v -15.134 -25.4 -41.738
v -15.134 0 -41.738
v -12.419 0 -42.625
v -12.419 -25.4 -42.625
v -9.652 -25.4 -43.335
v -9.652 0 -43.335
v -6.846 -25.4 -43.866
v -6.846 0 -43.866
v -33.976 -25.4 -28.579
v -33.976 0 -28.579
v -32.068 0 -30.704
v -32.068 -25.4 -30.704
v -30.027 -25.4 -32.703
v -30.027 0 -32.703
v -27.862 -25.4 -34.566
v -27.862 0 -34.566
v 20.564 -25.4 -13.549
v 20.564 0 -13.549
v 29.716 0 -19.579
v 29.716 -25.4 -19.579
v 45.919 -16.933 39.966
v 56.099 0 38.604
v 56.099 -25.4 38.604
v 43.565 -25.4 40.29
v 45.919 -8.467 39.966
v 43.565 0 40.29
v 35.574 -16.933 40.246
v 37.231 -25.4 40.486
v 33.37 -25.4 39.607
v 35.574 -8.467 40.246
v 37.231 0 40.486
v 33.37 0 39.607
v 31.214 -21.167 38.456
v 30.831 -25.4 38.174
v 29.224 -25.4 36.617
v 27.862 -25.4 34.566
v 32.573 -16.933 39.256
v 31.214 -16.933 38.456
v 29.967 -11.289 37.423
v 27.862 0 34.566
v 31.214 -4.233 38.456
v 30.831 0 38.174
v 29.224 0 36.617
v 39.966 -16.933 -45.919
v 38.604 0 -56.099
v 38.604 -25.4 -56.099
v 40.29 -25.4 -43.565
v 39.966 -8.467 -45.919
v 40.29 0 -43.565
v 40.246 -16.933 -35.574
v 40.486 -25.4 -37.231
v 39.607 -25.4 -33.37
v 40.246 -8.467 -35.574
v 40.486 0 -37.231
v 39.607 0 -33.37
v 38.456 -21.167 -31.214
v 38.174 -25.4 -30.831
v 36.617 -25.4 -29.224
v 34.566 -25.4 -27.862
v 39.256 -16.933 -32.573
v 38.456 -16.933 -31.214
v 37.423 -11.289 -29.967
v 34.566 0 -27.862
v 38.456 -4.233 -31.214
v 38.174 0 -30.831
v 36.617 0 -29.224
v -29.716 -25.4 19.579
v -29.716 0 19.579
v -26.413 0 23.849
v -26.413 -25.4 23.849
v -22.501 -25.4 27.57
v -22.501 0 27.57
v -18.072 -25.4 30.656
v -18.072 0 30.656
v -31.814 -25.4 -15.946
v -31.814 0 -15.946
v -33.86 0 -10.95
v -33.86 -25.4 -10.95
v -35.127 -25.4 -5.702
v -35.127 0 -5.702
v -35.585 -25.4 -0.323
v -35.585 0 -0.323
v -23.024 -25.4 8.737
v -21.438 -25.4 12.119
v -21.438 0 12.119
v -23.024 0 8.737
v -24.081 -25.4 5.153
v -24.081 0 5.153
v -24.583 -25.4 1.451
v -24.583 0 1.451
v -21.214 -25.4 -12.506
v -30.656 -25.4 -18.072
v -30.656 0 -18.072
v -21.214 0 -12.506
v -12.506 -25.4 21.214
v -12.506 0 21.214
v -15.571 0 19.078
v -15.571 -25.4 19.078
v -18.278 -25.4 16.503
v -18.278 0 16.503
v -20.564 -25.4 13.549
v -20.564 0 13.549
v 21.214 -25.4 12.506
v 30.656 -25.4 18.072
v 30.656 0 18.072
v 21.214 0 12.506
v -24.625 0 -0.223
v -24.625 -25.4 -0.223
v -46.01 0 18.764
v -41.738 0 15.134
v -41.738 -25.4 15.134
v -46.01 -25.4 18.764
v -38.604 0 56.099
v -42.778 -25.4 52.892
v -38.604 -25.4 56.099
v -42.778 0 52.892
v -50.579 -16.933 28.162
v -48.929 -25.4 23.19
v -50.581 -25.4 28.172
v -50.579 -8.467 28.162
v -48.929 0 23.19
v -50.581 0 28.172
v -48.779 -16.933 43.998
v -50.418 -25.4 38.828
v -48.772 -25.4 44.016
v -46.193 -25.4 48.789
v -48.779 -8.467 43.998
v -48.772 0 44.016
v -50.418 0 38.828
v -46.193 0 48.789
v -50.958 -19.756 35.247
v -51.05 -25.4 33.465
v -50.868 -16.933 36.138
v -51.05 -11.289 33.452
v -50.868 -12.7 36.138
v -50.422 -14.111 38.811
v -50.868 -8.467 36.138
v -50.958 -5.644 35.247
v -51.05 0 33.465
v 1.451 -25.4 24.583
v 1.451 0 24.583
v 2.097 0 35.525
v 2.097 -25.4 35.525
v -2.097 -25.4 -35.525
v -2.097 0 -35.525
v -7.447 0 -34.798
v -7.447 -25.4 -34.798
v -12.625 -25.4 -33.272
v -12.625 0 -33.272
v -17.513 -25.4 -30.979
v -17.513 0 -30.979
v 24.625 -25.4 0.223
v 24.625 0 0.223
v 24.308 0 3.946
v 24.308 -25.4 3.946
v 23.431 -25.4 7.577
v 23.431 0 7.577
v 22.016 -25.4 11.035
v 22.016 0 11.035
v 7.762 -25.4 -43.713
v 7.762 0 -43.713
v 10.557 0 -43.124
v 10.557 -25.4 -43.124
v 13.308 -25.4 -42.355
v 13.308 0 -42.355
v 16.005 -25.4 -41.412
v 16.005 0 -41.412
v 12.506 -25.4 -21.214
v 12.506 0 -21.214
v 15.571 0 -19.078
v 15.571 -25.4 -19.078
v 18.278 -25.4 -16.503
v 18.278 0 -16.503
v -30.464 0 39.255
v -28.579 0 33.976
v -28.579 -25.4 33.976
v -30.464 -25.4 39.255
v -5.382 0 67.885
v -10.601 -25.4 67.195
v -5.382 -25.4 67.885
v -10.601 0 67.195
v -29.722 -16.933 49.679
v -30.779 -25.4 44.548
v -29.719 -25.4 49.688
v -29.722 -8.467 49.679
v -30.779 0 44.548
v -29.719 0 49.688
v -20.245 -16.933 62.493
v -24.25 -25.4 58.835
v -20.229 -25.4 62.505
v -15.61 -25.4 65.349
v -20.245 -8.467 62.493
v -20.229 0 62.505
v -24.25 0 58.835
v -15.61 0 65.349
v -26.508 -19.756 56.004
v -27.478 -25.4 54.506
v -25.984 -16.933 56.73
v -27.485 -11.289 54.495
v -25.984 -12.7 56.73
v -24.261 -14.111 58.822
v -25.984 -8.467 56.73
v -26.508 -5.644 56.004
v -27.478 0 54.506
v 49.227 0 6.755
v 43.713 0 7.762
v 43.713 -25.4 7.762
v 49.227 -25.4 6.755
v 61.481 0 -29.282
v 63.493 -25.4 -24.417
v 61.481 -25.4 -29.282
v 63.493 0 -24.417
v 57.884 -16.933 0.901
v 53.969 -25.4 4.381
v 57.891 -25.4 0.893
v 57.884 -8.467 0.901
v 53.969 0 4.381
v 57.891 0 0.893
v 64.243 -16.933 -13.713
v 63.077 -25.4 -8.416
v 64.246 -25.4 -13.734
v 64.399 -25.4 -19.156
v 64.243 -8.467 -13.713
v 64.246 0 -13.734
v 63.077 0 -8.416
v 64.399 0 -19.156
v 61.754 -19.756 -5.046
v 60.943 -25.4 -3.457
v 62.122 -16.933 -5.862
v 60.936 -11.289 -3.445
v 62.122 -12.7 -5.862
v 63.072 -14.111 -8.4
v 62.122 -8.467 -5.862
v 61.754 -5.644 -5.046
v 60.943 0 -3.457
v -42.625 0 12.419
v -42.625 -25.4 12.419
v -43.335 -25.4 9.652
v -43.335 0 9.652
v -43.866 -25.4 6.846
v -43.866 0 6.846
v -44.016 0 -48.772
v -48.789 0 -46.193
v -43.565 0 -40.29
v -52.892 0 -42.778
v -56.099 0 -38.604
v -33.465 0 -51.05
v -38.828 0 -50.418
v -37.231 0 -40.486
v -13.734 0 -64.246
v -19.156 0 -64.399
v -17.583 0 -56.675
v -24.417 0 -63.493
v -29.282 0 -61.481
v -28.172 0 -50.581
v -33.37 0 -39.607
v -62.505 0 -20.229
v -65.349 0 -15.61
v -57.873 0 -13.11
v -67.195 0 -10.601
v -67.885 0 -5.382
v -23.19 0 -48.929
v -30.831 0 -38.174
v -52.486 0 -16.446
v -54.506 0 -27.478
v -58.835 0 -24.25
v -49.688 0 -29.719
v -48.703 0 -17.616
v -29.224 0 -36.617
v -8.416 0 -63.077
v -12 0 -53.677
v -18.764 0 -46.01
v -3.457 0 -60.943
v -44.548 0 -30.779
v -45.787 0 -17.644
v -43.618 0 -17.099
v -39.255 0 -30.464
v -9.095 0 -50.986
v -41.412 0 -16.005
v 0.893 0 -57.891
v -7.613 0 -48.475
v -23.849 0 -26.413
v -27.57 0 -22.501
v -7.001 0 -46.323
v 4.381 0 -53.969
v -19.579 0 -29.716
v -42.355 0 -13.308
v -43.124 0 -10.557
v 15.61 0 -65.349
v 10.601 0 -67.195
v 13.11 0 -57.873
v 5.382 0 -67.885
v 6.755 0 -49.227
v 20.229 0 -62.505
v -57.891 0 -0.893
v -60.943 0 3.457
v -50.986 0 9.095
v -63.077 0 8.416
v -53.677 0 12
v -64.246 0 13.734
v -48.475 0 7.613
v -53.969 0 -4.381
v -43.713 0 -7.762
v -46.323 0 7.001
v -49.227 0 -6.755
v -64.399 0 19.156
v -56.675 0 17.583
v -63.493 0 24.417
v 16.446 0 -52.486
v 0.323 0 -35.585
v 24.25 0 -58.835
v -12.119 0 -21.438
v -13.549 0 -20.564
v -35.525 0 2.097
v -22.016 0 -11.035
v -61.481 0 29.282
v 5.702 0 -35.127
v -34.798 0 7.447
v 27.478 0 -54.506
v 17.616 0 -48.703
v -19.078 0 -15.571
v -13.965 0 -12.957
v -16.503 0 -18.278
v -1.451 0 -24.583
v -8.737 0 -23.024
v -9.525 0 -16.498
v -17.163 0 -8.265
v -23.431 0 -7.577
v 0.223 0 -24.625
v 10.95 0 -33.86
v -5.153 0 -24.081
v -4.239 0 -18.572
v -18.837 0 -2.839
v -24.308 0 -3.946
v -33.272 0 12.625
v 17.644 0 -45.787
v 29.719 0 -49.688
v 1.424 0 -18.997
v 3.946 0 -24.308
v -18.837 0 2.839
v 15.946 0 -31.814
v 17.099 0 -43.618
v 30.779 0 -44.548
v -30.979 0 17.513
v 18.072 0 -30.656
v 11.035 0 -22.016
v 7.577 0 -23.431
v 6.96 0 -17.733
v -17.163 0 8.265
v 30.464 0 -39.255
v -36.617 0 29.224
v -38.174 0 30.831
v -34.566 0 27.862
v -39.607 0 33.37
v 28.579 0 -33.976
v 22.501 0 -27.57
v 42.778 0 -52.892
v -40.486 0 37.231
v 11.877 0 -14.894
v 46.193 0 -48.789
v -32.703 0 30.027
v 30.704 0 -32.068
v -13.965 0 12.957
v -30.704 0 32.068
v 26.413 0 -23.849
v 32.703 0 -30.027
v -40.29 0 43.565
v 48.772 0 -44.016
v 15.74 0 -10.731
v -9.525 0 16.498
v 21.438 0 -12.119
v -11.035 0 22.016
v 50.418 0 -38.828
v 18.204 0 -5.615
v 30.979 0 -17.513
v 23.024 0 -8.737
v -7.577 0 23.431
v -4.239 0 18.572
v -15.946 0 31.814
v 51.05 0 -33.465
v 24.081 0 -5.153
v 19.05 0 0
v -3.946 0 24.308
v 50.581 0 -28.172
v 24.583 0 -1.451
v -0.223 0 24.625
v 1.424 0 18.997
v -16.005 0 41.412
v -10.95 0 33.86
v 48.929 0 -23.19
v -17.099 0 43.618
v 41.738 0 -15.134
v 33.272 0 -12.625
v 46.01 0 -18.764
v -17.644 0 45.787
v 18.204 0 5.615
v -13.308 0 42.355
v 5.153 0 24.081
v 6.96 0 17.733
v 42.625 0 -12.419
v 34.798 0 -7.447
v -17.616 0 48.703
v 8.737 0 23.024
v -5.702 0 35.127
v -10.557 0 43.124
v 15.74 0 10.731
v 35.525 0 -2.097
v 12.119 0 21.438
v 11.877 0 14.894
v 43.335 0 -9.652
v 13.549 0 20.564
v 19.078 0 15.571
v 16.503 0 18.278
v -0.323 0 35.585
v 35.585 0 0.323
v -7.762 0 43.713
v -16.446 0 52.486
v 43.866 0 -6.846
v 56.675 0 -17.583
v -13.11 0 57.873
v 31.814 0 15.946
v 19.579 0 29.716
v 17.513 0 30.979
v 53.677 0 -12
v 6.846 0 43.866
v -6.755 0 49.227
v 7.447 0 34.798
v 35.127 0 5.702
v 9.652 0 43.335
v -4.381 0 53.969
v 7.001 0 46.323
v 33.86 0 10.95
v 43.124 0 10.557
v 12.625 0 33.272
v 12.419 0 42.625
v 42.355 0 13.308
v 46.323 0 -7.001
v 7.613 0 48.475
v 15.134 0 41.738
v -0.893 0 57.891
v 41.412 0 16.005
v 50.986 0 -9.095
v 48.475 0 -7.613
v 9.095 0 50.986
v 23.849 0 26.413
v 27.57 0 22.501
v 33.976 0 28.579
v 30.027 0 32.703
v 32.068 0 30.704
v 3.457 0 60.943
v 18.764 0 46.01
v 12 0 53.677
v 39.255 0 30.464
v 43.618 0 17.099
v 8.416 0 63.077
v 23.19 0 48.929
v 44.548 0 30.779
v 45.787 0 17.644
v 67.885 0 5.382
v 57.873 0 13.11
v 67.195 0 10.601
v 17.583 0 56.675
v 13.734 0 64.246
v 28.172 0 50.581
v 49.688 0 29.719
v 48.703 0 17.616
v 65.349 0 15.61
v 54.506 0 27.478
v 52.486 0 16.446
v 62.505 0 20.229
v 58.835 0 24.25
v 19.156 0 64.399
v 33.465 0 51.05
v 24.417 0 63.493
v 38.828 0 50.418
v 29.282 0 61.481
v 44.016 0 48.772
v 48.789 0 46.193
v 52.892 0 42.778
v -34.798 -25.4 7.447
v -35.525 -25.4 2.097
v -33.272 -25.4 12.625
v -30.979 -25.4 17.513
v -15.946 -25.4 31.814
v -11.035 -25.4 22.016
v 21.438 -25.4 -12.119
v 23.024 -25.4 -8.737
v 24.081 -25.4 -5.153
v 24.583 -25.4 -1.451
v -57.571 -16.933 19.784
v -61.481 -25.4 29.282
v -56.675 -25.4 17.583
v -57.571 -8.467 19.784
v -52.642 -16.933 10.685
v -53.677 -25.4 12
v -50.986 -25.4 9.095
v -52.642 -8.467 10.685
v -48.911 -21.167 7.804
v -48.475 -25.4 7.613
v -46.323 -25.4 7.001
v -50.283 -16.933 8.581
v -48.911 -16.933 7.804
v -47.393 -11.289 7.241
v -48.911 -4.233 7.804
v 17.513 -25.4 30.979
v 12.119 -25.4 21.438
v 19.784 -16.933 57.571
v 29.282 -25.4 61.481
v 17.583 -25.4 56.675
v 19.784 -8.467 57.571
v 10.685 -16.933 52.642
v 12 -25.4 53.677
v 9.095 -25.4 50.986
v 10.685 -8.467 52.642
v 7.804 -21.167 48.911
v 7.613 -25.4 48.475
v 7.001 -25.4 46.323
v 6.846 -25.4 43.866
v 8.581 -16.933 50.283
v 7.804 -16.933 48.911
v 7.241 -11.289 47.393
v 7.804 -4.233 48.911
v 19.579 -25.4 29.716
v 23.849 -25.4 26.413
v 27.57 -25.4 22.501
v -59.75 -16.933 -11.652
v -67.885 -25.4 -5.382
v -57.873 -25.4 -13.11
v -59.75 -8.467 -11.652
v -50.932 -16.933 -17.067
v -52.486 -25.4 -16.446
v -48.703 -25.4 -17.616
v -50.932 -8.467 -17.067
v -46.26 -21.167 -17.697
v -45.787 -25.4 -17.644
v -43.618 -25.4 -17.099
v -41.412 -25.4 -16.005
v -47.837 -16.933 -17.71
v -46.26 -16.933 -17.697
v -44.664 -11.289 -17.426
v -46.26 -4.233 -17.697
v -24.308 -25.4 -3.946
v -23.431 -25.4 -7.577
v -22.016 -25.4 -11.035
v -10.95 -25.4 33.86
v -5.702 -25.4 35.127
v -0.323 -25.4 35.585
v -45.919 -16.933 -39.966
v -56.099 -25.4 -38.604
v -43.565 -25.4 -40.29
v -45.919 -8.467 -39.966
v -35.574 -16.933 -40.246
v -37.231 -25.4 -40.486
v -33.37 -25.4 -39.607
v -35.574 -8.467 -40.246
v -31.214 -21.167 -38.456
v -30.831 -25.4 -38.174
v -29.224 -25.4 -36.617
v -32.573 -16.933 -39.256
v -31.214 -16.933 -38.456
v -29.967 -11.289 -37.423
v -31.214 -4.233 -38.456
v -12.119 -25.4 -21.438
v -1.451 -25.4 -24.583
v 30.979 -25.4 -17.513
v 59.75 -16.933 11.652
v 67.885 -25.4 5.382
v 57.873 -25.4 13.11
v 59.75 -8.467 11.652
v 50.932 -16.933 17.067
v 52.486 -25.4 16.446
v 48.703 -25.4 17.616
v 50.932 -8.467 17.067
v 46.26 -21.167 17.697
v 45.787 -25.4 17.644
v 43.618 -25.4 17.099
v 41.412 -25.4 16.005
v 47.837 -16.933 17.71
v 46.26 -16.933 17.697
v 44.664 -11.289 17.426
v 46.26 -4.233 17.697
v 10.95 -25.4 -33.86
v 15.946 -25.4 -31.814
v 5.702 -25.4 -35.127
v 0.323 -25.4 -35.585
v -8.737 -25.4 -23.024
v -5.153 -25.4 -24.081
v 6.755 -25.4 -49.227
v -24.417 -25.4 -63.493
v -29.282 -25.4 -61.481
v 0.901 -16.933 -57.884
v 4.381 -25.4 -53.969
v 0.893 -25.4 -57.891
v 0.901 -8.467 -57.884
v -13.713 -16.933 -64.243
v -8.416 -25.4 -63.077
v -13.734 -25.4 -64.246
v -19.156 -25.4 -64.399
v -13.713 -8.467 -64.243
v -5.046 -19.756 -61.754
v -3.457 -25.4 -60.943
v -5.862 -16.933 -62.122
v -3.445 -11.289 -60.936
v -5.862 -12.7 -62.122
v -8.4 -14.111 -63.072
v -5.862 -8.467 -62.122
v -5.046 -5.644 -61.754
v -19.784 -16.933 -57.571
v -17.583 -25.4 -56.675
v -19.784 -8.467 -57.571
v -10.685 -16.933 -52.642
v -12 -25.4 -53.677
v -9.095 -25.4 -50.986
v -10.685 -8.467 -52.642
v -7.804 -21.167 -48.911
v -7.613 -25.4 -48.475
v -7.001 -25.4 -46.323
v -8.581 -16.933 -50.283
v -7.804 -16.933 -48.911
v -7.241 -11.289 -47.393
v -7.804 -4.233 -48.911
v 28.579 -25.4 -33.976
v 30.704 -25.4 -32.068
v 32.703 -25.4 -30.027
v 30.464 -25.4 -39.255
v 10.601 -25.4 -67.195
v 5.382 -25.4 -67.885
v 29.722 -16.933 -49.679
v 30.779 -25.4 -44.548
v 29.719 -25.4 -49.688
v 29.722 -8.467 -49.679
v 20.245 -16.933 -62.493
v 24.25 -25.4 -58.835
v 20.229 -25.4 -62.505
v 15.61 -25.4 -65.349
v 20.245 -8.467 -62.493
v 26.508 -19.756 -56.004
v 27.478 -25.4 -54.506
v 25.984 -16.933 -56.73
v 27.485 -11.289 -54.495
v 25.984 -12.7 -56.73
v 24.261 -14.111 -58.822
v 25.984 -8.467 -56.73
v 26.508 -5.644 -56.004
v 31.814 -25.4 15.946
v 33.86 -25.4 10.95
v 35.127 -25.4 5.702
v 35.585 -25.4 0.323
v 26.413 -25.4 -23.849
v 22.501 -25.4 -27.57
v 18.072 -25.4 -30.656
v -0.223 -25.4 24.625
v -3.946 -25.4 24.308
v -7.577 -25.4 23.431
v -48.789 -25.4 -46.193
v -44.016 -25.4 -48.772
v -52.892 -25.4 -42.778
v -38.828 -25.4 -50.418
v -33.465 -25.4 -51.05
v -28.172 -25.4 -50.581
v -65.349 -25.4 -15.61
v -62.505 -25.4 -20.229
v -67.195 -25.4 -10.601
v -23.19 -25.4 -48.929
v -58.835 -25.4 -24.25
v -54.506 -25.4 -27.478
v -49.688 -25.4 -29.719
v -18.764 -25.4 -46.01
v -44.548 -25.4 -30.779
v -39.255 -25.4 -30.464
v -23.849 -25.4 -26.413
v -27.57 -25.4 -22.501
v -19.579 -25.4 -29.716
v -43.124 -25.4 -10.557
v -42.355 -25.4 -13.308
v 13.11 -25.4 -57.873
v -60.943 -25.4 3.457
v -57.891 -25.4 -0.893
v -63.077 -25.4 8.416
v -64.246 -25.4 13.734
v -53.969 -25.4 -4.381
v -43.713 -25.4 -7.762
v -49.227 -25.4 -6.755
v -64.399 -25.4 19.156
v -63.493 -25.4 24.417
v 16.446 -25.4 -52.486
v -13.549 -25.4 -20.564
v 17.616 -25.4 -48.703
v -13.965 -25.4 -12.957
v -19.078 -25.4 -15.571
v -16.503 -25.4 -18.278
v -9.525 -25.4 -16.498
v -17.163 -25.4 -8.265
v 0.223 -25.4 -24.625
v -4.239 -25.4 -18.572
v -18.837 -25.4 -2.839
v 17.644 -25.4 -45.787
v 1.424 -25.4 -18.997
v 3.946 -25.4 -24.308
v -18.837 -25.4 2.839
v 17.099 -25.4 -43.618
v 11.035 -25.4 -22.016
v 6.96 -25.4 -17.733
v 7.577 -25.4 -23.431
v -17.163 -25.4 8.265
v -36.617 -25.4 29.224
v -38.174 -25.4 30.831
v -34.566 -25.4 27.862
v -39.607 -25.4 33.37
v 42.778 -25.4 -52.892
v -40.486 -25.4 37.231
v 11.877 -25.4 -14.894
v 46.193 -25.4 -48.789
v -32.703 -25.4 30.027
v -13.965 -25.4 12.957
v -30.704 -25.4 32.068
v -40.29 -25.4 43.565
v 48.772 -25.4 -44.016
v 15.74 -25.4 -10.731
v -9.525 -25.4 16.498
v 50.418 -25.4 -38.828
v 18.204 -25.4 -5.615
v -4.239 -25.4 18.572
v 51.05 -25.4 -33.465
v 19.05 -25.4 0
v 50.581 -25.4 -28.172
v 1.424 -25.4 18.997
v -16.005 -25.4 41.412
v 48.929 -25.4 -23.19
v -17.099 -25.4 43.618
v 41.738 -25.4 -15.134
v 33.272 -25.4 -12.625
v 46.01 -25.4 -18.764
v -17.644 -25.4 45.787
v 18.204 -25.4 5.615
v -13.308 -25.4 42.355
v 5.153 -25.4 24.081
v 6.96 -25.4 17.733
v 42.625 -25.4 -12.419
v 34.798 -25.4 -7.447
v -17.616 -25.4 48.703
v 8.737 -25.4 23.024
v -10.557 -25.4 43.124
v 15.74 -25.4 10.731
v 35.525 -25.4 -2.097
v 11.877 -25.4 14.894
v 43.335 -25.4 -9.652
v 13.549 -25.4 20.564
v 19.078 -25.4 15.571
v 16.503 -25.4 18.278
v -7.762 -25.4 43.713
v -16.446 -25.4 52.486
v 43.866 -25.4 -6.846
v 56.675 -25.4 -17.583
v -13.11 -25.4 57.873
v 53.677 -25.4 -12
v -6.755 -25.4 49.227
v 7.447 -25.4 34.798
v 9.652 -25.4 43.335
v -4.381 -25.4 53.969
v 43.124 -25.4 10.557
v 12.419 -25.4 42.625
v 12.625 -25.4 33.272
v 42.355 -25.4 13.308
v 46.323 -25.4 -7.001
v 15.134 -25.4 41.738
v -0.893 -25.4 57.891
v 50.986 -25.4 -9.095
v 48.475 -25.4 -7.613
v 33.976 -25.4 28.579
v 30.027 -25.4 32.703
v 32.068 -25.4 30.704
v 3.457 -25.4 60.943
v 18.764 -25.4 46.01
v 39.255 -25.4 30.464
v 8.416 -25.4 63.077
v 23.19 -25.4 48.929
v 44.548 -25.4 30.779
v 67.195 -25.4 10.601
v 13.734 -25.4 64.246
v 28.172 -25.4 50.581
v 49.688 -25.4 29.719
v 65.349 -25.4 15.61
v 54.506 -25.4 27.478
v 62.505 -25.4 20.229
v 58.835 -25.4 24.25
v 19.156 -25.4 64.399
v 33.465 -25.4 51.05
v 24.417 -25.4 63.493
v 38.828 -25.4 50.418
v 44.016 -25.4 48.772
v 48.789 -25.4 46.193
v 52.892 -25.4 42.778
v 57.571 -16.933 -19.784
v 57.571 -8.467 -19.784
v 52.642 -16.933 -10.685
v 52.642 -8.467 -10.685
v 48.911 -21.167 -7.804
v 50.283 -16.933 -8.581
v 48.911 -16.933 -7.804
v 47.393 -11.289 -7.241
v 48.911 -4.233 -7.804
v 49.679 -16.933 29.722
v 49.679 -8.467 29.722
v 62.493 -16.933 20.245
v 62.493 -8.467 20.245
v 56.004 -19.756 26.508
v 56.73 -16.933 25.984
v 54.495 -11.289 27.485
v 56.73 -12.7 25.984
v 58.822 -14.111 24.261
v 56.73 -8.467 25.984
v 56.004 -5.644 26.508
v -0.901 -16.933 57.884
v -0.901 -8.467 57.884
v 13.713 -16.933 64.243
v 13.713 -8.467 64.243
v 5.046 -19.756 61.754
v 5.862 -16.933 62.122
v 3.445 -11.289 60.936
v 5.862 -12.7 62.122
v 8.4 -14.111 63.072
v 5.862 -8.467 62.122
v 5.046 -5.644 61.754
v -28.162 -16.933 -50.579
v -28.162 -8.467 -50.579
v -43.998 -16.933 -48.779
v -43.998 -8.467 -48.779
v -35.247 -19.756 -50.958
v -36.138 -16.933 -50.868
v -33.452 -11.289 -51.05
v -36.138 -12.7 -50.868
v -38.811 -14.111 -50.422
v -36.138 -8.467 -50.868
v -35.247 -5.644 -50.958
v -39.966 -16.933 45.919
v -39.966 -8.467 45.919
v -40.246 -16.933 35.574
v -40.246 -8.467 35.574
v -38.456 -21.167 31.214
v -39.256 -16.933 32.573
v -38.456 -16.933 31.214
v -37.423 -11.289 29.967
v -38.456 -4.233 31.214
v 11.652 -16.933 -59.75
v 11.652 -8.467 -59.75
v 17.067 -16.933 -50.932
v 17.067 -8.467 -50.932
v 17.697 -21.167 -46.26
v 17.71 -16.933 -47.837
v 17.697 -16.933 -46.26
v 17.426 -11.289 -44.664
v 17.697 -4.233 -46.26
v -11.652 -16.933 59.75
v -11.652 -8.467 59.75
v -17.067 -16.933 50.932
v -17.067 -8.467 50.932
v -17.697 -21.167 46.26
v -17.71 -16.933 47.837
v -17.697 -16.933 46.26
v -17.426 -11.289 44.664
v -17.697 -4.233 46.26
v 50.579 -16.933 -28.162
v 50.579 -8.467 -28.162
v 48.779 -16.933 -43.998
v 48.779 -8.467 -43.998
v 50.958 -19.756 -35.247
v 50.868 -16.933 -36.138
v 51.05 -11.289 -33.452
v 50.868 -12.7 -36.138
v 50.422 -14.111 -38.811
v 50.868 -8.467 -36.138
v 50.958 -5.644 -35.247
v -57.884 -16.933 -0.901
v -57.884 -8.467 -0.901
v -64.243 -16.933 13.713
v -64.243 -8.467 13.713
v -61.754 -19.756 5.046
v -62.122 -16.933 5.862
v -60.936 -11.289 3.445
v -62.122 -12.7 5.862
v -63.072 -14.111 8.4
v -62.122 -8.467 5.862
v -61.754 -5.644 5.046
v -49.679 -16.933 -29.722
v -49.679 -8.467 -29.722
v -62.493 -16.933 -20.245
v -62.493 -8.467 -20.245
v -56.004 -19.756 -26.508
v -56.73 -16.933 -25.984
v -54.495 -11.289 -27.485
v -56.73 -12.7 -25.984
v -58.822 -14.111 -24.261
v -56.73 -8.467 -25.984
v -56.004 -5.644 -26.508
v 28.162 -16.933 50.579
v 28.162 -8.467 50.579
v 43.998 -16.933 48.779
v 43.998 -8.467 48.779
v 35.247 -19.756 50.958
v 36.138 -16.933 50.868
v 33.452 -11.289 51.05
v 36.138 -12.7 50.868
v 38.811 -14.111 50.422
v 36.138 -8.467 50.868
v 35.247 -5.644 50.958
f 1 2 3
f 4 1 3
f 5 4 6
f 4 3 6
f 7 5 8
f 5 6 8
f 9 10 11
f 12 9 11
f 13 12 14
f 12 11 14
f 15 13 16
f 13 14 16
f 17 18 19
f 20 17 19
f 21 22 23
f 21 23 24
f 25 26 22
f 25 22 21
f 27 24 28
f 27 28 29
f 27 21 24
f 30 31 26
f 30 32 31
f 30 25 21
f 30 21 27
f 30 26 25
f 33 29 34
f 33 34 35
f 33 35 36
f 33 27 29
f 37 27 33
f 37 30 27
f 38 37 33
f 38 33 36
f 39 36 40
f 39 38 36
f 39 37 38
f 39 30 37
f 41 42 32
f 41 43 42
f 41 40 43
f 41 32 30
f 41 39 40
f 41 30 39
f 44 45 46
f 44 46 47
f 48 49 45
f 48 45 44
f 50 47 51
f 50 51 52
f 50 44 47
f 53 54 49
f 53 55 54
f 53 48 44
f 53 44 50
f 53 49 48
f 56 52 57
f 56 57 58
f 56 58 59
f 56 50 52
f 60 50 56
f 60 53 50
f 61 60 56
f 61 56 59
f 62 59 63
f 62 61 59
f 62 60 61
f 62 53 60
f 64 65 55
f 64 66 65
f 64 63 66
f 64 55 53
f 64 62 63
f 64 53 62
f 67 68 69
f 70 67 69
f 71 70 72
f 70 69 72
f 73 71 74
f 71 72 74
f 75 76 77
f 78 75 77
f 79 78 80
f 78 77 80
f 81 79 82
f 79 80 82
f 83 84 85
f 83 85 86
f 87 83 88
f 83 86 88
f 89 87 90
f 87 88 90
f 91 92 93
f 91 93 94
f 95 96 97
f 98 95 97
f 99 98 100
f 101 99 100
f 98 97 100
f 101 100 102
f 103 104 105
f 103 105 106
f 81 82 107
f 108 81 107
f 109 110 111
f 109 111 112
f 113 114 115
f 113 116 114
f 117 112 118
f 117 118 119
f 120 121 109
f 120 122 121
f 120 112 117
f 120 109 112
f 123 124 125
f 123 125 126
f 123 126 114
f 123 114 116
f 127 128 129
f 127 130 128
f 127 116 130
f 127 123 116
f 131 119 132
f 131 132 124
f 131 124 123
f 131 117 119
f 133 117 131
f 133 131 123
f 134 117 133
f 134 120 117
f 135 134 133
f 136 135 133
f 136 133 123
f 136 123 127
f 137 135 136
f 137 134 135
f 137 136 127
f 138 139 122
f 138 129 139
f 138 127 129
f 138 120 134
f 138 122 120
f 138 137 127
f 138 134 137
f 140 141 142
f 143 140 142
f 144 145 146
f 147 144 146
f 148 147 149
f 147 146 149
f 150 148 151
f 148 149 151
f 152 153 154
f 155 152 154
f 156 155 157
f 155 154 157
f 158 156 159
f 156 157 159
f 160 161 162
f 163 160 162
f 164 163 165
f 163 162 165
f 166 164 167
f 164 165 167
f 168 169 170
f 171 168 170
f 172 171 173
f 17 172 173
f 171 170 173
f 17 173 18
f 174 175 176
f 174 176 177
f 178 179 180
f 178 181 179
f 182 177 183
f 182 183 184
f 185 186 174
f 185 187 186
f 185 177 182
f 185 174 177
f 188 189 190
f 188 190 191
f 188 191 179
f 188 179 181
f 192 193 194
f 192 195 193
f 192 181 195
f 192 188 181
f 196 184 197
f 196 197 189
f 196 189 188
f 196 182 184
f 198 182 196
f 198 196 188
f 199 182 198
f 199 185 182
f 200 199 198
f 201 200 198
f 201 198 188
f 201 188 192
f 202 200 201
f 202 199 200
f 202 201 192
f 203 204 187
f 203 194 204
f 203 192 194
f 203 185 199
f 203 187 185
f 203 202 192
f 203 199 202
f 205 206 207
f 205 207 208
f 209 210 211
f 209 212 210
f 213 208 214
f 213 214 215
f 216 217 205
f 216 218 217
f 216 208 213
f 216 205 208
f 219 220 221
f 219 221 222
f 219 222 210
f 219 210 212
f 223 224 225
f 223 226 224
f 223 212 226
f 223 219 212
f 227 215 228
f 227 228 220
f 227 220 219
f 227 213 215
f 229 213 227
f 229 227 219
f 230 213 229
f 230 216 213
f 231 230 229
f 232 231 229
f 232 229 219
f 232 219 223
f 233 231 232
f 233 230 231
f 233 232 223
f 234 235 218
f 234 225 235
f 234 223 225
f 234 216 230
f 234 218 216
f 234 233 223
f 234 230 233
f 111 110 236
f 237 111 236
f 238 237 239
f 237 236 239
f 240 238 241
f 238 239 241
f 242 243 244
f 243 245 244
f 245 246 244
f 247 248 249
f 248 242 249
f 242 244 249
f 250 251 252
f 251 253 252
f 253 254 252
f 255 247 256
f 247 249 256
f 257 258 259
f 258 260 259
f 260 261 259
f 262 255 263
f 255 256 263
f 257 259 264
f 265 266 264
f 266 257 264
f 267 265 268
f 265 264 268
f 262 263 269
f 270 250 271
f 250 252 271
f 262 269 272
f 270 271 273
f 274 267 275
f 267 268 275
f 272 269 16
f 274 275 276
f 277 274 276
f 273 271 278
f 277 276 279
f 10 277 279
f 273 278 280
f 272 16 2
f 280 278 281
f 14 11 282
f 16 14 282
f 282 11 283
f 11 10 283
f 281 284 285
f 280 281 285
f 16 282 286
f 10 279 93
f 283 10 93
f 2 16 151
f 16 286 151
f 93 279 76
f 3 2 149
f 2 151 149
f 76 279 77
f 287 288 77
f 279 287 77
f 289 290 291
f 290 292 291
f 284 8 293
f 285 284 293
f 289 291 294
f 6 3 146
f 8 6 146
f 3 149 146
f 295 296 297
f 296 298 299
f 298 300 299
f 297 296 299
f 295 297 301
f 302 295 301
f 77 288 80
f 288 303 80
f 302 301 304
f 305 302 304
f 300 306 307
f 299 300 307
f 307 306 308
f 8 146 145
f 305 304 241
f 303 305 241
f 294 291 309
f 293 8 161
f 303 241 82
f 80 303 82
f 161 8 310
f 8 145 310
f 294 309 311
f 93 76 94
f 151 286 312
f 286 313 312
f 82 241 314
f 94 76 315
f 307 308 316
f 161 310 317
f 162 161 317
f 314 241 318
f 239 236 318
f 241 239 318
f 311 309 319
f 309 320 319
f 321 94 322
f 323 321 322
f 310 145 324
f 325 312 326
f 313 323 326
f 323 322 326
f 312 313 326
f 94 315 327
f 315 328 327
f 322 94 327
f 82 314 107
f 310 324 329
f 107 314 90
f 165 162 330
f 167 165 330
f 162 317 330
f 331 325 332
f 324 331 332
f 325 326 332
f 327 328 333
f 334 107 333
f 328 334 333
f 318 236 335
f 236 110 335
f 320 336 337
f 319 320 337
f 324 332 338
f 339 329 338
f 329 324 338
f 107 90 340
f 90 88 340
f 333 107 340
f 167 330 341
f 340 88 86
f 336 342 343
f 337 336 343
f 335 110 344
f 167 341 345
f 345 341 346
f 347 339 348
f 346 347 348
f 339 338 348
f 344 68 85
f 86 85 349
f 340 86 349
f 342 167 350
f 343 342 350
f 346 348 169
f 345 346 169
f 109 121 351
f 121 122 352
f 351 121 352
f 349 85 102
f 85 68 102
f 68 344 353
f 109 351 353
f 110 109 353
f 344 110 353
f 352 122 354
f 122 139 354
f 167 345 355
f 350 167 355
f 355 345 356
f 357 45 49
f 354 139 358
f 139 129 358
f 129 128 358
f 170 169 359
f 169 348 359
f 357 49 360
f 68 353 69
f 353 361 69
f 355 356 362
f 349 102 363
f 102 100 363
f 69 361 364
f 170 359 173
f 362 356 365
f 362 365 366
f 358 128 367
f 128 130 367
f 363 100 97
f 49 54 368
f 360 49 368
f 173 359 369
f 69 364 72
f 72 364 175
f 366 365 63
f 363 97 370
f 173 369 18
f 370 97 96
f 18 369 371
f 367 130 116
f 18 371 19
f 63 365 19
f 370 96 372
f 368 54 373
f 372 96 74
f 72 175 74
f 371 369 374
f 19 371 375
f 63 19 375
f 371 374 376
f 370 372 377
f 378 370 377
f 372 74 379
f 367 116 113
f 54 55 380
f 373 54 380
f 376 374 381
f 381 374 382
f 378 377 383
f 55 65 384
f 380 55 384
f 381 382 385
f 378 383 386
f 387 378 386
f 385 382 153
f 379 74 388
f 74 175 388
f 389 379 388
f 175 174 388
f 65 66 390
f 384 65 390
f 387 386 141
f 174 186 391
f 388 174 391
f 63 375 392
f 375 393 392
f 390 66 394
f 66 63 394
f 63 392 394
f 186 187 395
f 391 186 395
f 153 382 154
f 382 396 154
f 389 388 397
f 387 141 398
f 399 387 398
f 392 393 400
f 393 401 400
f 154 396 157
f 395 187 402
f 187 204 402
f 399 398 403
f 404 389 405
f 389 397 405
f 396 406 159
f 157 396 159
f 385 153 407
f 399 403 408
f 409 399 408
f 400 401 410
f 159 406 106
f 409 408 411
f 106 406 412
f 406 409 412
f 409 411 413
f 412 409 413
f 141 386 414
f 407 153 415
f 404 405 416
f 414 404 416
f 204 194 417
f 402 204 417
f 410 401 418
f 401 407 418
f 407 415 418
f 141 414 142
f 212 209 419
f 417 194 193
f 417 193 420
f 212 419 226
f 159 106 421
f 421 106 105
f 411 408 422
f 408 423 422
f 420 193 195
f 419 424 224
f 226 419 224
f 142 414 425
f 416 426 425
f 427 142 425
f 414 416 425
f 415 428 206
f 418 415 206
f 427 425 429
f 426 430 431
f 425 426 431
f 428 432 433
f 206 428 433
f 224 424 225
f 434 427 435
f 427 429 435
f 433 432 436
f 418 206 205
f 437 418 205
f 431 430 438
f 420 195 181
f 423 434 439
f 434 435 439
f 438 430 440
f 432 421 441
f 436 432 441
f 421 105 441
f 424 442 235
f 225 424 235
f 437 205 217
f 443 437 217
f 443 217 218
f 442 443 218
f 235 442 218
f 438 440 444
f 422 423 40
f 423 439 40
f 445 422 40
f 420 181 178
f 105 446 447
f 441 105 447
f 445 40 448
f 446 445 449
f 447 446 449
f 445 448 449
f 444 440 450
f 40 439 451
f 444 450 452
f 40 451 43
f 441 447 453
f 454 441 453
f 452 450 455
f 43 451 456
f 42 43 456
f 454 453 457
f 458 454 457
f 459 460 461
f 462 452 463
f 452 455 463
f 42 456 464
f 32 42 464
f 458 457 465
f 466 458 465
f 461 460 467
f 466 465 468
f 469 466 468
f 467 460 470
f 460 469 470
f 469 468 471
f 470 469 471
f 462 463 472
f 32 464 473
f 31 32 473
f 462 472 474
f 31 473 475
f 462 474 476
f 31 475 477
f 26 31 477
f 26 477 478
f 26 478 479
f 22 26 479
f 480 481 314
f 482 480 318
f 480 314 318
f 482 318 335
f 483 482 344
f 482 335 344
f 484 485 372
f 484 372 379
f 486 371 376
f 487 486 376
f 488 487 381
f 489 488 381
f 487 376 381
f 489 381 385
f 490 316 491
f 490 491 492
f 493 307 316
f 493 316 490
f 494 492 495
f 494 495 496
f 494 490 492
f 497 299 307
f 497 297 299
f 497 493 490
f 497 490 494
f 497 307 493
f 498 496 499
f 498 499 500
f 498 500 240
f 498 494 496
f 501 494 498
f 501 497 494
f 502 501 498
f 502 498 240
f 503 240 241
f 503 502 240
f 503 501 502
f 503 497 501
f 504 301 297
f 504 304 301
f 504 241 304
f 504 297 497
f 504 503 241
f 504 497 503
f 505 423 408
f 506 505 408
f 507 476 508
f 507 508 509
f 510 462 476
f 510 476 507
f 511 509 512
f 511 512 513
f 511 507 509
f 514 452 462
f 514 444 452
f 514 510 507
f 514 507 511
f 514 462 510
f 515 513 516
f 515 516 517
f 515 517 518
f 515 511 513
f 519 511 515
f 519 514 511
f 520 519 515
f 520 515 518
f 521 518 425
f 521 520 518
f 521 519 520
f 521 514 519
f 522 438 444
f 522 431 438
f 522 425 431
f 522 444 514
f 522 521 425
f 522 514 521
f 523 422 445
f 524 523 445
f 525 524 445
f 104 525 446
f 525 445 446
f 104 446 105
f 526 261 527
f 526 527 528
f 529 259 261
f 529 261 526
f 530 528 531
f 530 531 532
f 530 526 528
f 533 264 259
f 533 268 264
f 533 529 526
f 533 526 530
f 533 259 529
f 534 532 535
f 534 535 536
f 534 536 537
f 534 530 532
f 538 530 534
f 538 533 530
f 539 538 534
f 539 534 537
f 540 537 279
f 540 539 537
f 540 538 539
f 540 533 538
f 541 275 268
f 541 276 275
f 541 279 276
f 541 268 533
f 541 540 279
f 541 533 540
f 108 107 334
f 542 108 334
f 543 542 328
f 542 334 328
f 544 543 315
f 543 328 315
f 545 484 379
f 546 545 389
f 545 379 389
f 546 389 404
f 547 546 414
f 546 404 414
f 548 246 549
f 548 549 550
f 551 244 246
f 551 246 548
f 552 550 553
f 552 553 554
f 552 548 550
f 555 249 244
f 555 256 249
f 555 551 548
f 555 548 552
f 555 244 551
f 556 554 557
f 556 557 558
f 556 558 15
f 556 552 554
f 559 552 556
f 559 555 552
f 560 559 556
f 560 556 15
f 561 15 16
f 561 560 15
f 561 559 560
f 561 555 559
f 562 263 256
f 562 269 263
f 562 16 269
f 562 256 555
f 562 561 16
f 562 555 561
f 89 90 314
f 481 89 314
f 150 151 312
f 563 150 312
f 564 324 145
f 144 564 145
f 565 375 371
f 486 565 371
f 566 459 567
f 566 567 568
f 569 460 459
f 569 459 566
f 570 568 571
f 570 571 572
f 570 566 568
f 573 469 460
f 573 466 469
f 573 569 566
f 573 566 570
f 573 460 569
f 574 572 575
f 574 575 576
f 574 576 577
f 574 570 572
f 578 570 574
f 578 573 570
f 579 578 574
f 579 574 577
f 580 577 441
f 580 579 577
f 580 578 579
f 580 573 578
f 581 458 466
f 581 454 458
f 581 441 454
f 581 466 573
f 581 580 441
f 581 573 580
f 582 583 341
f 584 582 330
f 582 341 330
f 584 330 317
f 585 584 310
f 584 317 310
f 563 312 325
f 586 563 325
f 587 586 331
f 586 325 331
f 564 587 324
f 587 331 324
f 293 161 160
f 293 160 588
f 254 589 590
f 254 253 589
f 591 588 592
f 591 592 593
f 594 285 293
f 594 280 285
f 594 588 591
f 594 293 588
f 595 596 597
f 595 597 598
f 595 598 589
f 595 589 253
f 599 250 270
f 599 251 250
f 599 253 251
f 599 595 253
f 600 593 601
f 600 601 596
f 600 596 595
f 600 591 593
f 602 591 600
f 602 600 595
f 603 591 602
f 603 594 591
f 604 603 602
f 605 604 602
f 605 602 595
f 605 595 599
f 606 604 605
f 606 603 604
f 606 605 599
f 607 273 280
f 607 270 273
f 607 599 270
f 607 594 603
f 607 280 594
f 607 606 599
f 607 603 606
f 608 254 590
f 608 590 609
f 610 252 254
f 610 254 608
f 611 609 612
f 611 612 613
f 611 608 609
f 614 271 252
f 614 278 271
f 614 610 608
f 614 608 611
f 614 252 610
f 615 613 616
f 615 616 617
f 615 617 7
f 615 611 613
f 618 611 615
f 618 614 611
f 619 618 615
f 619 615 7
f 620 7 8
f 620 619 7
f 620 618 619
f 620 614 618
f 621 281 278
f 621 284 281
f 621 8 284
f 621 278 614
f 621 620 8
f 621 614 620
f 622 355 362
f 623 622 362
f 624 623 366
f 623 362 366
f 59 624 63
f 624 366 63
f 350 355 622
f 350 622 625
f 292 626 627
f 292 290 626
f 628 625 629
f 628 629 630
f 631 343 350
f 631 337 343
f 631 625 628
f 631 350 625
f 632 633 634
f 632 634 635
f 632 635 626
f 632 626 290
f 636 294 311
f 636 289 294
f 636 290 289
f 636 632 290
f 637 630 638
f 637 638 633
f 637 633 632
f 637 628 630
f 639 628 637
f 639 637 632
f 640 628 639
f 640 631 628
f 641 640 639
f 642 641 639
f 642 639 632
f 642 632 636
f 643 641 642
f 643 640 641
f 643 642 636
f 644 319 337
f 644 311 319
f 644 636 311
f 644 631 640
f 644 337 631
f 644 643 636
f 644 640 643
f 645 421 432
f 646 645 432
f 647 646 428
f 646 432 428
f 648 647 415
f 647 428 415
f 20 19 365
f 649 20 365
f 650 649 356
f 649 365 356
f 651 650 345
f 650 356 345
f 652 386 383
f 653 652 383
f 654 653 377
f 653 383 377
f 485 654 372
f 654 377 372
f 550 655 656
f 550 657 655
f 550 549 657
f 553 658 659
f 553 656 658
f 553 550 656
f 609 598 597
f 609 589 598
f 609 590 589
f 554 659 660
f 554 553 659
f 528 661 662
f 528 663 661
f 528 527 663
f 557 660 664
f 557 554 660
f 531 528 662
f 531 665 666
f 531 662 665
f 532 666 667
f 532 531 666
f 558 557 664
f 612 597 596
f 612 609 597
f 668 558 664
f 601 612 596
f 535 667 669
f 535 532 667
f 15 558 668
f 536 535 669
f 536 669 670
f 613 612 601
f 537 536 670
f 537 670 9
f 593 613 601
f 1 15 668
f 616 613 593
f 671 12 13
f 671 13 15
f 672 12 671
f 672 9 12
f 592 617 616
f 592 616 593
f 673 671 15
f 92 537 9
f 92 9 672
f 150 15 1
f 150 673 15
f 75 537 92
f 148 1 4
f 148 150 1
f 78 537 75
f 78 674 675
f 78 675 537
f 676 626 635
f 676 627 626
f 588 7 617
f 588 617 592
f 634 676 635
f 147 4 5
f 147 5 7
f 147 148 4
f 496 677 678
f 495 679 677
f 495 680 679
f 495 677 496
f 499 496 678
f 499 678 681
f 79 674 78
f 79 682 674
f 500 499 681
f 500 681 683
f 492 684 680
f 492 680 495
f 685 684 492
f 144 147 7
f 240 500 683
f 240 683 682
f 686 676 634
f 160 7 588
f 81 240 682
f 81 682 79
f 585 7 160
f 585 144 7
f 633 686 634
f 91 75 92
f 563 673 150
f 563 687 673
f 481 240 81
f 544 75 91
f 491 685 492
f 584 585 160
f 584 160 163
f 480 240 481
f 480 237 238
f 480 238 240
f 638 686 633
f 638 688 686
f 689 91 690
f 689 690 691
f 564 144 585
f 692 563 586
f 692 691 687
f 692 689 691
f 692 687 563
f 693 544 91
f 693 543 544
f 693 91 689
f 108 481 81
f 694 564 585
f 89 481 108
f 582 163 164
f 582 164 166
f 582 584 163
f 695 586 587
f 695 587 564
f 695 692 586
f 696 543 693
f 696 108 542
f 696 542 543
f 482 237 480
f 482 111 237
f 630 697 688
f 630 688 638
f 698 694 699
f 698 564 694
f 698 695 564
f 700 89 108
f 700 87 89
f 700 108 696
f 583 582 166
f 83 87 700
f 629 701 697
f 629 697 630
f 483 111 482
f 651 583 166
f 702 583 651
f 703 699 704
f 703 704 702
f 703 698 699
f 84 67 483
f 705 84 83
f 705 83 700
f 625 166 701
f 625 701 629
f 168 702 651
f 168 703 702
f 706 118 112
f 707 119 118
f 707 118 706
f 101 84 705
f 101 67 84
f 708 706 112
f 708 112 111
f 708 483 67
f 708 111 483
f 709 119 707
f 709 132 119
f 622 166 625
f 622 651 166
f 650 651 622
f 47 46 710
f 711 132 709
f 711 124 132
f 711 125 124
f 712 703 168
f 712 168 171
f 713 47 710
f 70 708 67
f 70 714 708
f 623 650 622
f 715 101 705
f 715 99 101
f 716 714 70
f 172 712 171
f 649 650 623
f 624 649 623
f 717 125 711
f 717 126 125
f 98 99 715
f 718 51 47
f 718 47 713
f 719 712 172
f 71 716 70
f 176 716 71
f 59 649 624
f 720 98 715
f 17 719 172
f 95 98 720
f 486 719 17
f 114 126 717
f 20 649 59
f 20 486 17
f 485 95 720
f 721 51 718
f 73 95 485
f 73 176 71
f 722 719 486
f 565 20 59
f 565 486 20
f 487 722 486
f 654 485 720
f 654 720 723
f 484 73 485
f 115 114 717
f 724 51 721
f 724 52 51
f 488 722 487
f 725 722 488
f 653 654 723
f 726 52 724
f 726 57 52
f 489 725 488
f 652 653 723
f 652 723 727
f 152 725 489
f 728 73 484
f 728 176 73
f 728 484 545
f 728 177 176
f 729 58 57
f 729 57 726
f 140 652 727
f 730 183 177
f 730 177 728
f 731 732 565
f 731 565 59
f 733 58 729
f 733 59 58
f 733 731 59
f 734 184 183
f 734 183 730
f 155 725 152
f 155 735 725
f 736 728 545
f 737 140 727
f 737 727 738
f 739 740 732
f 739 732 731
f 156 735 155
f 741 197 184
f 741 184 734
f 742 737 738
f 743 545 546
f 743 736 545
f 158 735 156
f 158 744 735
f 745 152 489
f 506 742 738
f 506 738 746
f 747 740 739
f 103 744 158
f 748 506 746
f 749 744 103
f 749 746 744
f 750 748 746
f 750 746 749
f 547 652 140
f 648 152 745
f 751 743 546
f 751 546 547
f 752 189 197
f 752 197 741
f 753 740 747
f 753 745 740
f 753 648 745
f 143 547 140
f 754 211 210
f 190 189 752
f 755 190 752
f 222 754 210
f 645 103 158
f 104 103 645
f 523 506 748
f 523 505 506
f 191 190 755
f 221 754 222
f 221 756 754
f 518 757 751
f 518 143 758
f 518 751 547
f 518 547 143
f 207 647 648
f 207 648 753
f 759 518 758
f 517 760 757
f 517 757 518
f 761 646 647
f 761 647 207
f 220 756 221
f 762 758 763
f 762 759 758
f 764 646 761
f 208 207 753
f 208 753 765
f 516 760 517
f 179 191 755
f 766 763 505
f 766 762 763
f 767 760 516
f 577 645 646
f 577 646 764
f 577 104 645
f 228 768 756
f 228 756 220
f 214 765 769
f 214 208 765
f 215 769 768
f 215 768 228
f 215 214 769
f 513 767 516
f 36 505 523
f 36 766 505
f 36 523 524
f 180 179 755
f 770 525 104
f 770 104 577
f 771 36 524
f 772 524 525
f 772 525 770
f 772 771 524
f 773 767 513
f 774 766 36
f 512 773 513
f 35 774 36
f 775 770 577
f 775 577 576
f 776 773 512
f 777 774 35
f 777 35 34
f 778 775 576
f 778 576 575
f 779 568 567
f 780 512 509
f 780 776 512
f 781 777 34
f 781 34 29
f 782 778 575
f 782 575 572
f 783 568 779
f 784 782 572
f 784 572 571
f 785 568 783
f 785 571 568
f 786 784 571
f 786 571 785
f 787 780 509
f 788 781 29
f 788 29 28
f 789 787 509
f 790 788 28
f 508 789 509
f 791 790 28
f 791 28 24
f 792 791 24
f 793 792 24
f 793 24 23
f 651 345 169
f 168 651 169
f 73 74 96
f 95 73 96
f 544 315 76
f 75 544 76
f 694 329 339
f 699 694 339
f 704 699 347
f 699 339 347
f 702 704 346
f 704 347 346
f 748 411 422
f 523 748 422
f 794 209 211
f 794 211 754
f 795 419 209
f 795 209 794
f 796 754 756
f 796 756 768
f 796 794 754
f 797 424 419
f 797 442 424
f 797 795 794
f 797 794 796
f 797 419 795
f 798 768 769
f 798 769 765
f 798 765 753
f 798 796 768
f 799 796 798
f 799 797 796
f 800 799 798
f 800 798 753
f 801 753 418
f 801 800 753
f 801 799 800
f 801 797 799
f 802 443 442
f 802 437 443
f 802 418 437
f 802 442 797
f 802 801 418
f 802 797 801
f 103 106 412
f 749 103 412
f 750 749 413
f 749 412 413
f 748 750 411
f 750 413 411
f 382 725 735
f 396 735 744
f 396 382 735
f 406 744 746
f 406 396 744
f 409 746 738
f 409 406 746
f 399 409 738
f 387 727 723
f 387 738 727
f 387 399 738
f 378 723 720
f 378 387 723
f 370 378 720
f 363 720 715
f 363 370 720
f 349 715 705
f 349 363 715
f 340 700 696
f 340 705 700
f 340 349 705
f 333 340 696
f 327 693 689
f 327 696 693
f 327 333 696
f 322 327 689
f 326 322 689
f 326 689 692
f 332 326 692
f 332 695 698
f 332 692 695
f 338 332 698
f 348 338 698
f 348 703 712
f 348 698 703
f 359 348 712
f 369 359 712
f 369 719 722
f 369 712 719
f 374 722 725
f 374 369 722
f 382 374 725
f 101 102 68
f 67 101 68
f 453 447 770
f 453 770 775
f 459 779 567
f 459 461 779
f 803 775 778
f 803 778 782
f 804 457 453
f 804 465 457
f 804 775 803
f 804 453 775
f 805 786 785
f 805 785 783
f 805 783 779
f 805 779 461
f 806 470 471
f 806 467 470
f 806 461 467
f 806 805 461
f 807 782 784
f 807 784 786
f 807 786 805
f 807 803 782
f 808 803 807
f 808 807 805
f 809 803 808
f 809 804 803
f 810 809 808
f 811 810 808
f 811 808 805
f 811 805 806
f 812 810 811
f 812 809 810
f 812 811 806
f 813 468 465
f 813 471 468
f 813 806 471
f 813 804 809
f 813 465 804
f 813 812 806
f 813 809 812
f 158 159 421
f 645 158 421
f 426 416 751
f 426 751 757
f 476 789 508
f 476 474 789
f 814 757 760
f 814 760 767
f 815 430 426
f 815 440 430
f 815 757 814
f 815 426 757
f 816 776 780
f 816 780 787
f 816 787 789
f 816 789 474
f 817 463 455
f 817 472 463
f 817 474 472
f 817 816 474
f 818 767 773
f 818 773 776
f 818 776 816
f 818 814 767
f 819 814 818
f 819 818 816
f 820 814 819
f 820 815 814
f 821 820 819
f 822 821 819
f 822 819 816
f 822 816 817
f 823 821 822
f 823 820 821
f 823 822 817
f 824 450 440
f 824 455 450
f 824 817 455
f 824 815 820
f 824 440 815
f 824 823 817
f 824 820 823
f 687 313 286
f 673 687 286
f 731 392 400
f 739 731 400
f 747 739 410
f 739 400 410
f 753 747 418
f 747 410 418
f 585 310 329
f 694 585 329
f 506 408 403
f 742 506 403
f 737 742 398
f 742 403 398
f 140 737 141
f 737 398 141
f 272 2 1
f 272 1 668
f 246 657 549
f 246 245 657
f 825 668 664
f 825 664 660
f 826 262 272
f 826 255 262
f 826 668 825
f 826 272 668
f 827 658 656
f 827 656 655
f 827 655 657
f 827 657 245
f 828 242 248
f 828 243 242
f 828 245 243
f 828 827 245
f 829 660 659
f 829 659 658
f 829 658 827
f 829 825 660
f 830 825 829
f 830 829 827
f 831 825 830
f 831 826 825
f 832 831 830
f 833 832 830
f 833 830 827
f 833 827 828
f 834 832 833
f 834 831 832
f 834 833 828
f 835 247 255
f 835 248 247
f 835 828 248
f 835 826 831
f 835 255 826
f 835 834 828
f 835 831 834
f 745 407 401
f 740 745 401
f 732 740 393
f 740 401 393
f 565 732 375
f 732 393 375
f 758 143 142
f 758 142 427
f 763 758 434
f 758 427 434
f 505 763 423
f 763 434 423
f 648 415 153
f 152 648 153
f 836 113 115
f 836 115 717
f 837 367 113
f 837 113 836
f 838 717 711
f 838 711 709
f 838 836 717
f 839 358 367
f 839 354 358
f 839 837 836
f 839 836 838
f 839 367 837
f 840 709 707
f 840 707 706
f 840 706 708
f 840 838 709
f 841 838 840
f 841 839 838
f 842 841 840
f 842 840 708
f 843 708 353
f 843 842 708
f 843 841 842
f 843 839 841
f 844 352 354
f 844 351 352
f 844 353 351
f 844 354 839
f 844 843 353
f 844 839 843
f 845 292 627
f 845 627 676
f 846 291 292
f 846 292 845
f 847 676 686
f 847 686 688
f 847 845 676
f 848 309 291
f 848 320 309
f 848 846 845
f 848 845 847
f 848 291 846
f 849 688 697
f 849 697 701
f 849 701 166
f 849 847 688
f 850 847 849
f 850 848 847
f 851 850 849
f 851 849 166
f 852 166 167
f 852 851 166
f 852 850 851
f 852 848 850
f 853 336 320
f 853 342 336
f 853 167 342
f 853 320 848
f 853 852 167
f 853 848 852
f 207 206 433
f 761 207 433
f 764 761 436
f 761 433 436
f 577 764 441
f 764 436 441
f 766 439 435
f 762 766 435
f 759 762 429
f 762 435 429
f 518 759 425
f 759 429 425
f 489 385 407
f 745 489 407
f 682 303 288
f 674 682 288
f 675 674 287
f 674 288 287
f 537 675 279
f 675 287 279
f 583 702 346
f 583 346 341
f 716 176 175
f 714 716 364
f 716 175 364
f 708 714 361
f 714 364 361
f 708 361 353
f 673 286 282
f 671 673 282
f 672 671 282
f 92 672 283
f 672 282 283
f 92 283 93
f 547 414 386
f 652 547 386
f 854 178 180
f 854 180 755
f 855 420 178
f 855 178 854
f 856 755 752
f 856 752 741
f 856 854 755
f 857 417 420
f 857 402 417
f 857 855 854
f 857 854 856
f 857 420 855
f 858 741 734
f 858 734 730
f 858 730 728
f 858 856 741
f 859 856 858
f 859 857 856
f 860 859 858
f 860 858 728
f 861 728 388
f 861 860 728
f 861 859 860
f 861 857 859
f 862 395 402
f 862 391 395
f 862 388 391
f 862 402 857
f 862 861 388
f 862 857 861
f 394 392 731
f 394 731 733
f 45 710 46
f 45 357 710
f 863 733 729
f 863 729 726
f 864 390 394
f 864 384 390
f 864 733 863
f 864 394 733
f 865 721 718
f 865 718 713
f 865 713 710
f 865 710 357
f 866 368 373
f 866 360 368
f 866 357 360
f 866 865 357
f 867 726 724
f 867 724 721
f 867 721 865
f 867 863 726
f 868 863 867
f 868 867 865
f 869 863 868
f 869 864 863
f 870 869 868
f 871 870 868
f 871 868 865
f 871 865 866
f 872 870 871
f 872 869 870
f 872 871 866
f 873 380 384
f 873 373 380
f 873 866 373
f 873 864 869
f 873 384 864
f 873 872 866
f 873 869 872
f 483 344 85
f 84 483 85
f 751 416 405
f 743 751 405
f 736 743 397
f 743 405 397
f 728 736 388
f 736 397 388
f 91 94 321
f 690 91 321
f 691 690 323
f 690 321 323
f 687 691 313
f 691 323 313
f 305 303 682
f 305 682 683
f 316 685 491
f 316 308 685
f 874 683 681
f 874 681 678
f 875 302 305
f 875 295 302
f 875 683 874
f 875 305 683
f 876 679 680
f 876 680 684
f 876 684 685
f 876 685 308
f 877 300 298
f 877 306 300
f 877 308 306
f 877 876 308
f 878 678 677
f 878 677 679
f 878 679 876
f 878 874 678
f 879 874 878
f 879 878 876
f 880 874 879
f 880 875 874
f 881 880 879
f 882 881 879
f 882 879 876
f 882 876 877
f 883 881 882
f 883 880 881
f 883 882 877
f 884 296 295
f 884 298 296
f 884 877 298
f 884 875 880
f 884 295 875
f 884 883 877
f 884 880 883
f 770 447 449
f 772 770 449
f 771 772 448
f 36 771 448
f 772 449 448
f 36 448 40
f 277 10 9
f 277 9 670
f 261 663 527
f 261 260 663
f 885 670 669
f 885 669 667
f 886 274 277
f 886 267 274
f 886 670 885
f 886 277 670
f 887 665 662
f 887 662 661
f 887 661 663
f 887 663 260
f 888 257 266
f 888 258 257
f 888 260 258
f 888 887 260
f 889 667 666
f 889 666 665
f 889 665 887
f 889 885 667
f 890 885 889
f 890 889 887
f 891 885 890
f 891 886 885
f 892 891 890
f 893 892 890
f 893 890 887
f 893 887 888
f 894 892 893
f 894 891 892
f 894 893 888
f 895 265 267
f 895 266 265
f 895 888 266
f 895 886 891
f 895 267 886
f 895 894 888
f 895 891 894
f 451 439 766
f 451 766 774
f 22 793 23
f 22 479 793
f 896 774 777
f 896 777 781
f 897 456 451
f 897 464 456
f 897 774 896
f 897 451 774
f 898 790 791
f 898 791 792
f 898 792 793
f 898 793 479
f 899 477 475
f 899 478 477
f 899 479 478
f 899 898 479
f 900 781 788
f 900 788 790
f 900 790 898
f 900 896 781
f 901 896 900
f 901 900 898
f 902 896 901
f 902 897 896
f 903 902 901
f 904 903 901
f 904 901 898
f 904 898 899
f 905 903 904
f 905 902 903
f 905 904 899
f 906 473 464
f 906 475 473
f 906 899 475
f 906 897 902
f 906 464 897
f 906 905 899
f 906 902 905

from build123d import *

# Parameters (mm, degrees)
F0_R     = 19.05
F1_DEPTH = 25.4
F3_COUNT = 12


with BuildPart() as f1:
    # F0 (on Front) → F1 (new body)
    with BuildSketch(Plane.XZ):
        with BuildLine():
            ThreePointArc((-41.7377949639, 15.1344033998), (-7.6831234343, -43.7271461338), (44.3970009653, 0))
            ThreePointArc((44.3970009653, 0), (14.7724939885, 41.8672558938), (-34.5663108784, 27.8615119291))
            ThreePointArc((-34.5663108784, 27.8615119291), (-38.6791153593, 21.7949473443), (-41.7377949639, 15.1344033998))
        make_face()
        with BuildLine():
            ThreePointArc((30.6559904103, 18.0721064124), (31.253015986, 17.0188063622), (31.8138653762, 15.9458065975))
            ThreePointArc((31.8138653762, 15.9458065975), (34.6304146039, 8.1929947261), (35.5863847309, 0))
            ThreePointArc((35.5863847309, 0), (34.4152420977, -9.0543851018), (30.9788984582, -17.5128132673))
            ThreePointArc((30.9788984582, -17.5128132673), (30.3652266448, -18.5565026077), (29.7164062853, -19.5787123096))
            ThreePointArc((29.7164062853, -19.5787123096), (17.0188063622, -31.253015986), (0.3229080478, -35.5849196797))
            ThreePointArc((0.3229080478, -35.5849196797), (-0.8877893412, -35.5753089699), (-2.0974590909, -35.5245189071))
            ThreePointArc((-2.0974590909, -35.5245189071), (-18.5565026077, -30.3652266448), (-30.6559904103, -18.0721064124))
            ThreePointArc((-30.6559904103, -18.0721064124), (-31.253015986, -17.0188063622), (-31.8138653762, -15.9458065975))
            ThreePointArc((-31.8138653762, -15.9458065975), (-35.5753089699, 0.8877893412), (-30.9788984582, 17.5128132673))
            ThreePointArc((-30.9788984582, 17.5128132673), (-30.3652266448, 18.5565026077), (-29.7164062853, 19.5787123096))
            ThreePointArc((-29.7164062853, 19.5787123096), (-17.0188063622, 31.253015986), (-0.3229080478, 35.5849196797))
            ThreePointArc((-0.3229080478, 35.5849196797), (0.8877893412, 35.5753089699), (2.0974590909, 35.5245189071))
            ThreePointArc((2.0974590909, 35.5245189071), (18.5565026077, 30.3652266448), (30.6559904103, 18.0721064124))
        make_face(mode=Mode.SUBTRACT)
        with BuildLine():
            ThreePointArc((-41.7377949639, 15.1344033998), (-38.6791153593, 21.7949473443), (-34.5663108784, 27.8615119291))
            add(Edge.make_bspline(
                [(-38.603553939, 56.0993393118), (-38.8812801549, 46.9344672316), (-44.8523311706, 33.3260222193), (-34.5663108784, 27.8615119291)],
                knots=[0, 0, 0, 0, 28.5249754922, 28.5249754922, 28.5249754922, 28.5249754922], degree=3))
            add(Edge.make_bspline(
                [(-41.7377949639, 15.1344033998), (-56.6555790407, 24.577734095), (-52.2119989513, 48.0453613593), (-38.603553939, 56.0993393118)],
                knots=[0, 0, 0, 0, 41.0846618713, 41.0846618713, 41.0846618713, 41.0846618713], degree=3))
        make_face()
        with BuildLine():
            Line((30.9788984582, -17.5128132673), (21.4377224413, -12.1190503432))
            ThreePointArc((21.4377224413, -12.1190503432), (21.0130551141, -12.8412943062), (20.5640646247, -13.5486741344))
            Line((20.5640646247, -13.5486741344), (29.7164062853, -19.5787123096))
            ThreePointArc((29.7164062853, -19.5787123096), (30.3652266448, -18.5565026077), (30.9788984582, -17.5128132673))
        make_face()
        with BuildLine():
            ThreePointArc((21.2142666876, 12.5060870618), (21.6274146437, 11.7771923869), (22.0155283003, 11.0346653029))
            Line((22.0155283003, 11.0346653029), (31.8138653762, 15.9458065975))
            ThreePointArc((31.8138653762, 15.9458065975), (31.253015986, 17.0188063622), (30.6559904103, 18.0721064124))
            Line((30.6559904103, 18.0721064124), (21.2142666876, 12.5060870618))
        make_face()
        with BuildLine():
            ThreePointArc((-0.2234557537, 24.625137405), (0.6143595296, 24.6184866931), (1.4514636756, 24.5833394373))
            Line((1.4514636756, 24.5833394373), (2.0974590909, 35.5245189071))
            ThreePointArc((2.0974590909, 35.5245189071), (0.8877893412, 35.5753089699), (-0.3229080478, 35.5849196797))
            Line((-0.3229080478, 35.5849196797), (-0.2234557537, 24.625137405))
        make_face()
        with BuildLine():
            ThreePointArc((-21.4377224413, 12.1190503432), (-21.0130551141, 12.8412943062), (-20.5640646247, 13.5486741344))
            Line((-20.5640646247, 13.5486741344), (-29.7164062853, 19.5787123096))
            ThreePointArc((-29.7164062853, 19.5787123096), (-30.3652266448, 18.5565026077), (-30.9788984582, 17.5128132673))
            Line((-30.9788984582, 17.5128132673), (-21.4377224413, 12.1190503432))
        make_face()
        with BuildLine():
            Line((-30.6559904103, -18.0721064124), (-21.2142666876, -12.5060870618))
            ThreePointArc((-21.2142666876, -12.5060870618), (-21.6274146437, -11.7771923869), (-22.0155283003, -11.0346653029))
            Line((-22.0155283003, -11.0346653029), (-31.8138653762, -15.9458065975))
            ThreePointArc((-31.8138653762, -15.9458065975), (-31.253015986, -17.0188063622), (-30.6559904103, -18.0721064124))
        make_face()
        with BuildLine():
            Line((0.3229080478, -35.5849196797), (0.2234557537, -24.625137405))
            ThreePointArc((0.2234557537, -24.625137405), (-0.6143595296, -24.6184866931), (-1.4514636756, -24.5833394373))
            Line((-1.4514636756, -24.5833394373), (-2.0974590909, -35.5245189071))
            ThreePointArc((-2.0974590909, -35.5245189071), (-0.8877893412, -35.5753089699), (0.3229080478, -35.5849196797))
        make_face()
        with BuildLine():
            ThreePointArc((21.4377224413, -12.1190503432), (23.8157082582, -6.2657293949), (24.6261512358, 0))
            ThreePointArc((24.6261512358, 0), (23.9646098878, 5.6696382261), (22.0155283003, 11.0346653029))
            ThreePointArc((22.0155283003, 11.0346653029), (21.6274146437, 11.7771923869), (21.2142666876, 12.5060870618))
            ThreePointArc((21.2142666876, 12.5060870618), (12.8412943062, 21.0130551141), (1.4514636756, 24.5833394373))
            ThreePointArc((1.4514636756, 24.5833394373), (0.6143595296, 24.6184866931), (-0.2234557537, 24.625137405))
            ThreePointArc((-0.2234557537, 24.625137405), (-11.7771923869, 21.6274146437), (-20.5640646247, 13.5486741344))
            ThreePointArc((-20.5640646247, 13.5486741344), (-21.0130551141, 12.8412943062), (-21.4377224413, 12.1190503432))
            ThreePointArc((-21.4377224413, 12.1190503432), (-24.6184866931, 0.6143595296), (-22.0155283003, -11.0346653029))
            ThreePointArc((-22.0155283003, -11.0346653029), (-21.6274146437, -11.7771923869), (-21.2142666876, -12.5060870618))
            ThreePointArc((-21.2142666876, -12.5060870618), (-12.8412943062, -21.0130551141), (-1.4514636756, -24.5833394373))
            ThreePointArc((-1.4514636756, -24.5833394373), (-0.6143595296, -24.6184866931), (0.2234557537, -24.625137405))
            ThreePointArc((0.2234557537, -24.625137405), (11.7771923869, -21.6274146437), (20.5640646247, -13.5486741344))
            ThreePointArc((20.5640646247, -13.5486741344), (21.0130551141, -12.8412943062), (21.4377224413, -12.1190503432))
        make_face()
        Circle(F0_R, mode=Mode.SUBTRACT)
    extrude(amount=F1_DEPTH)

    # F3: F1 ×12 about axis
    f3_axis = Axis((0, -7.1261581033, 0), (0, -1, 0))


with BuildPart() as f1_1:
    add(f1.part)
    for i in range(1, F3_COUNT):
        add(f1.part.rotate(f3_axis, i * 360 / F3_COUNT))


solid = f1_1.part
